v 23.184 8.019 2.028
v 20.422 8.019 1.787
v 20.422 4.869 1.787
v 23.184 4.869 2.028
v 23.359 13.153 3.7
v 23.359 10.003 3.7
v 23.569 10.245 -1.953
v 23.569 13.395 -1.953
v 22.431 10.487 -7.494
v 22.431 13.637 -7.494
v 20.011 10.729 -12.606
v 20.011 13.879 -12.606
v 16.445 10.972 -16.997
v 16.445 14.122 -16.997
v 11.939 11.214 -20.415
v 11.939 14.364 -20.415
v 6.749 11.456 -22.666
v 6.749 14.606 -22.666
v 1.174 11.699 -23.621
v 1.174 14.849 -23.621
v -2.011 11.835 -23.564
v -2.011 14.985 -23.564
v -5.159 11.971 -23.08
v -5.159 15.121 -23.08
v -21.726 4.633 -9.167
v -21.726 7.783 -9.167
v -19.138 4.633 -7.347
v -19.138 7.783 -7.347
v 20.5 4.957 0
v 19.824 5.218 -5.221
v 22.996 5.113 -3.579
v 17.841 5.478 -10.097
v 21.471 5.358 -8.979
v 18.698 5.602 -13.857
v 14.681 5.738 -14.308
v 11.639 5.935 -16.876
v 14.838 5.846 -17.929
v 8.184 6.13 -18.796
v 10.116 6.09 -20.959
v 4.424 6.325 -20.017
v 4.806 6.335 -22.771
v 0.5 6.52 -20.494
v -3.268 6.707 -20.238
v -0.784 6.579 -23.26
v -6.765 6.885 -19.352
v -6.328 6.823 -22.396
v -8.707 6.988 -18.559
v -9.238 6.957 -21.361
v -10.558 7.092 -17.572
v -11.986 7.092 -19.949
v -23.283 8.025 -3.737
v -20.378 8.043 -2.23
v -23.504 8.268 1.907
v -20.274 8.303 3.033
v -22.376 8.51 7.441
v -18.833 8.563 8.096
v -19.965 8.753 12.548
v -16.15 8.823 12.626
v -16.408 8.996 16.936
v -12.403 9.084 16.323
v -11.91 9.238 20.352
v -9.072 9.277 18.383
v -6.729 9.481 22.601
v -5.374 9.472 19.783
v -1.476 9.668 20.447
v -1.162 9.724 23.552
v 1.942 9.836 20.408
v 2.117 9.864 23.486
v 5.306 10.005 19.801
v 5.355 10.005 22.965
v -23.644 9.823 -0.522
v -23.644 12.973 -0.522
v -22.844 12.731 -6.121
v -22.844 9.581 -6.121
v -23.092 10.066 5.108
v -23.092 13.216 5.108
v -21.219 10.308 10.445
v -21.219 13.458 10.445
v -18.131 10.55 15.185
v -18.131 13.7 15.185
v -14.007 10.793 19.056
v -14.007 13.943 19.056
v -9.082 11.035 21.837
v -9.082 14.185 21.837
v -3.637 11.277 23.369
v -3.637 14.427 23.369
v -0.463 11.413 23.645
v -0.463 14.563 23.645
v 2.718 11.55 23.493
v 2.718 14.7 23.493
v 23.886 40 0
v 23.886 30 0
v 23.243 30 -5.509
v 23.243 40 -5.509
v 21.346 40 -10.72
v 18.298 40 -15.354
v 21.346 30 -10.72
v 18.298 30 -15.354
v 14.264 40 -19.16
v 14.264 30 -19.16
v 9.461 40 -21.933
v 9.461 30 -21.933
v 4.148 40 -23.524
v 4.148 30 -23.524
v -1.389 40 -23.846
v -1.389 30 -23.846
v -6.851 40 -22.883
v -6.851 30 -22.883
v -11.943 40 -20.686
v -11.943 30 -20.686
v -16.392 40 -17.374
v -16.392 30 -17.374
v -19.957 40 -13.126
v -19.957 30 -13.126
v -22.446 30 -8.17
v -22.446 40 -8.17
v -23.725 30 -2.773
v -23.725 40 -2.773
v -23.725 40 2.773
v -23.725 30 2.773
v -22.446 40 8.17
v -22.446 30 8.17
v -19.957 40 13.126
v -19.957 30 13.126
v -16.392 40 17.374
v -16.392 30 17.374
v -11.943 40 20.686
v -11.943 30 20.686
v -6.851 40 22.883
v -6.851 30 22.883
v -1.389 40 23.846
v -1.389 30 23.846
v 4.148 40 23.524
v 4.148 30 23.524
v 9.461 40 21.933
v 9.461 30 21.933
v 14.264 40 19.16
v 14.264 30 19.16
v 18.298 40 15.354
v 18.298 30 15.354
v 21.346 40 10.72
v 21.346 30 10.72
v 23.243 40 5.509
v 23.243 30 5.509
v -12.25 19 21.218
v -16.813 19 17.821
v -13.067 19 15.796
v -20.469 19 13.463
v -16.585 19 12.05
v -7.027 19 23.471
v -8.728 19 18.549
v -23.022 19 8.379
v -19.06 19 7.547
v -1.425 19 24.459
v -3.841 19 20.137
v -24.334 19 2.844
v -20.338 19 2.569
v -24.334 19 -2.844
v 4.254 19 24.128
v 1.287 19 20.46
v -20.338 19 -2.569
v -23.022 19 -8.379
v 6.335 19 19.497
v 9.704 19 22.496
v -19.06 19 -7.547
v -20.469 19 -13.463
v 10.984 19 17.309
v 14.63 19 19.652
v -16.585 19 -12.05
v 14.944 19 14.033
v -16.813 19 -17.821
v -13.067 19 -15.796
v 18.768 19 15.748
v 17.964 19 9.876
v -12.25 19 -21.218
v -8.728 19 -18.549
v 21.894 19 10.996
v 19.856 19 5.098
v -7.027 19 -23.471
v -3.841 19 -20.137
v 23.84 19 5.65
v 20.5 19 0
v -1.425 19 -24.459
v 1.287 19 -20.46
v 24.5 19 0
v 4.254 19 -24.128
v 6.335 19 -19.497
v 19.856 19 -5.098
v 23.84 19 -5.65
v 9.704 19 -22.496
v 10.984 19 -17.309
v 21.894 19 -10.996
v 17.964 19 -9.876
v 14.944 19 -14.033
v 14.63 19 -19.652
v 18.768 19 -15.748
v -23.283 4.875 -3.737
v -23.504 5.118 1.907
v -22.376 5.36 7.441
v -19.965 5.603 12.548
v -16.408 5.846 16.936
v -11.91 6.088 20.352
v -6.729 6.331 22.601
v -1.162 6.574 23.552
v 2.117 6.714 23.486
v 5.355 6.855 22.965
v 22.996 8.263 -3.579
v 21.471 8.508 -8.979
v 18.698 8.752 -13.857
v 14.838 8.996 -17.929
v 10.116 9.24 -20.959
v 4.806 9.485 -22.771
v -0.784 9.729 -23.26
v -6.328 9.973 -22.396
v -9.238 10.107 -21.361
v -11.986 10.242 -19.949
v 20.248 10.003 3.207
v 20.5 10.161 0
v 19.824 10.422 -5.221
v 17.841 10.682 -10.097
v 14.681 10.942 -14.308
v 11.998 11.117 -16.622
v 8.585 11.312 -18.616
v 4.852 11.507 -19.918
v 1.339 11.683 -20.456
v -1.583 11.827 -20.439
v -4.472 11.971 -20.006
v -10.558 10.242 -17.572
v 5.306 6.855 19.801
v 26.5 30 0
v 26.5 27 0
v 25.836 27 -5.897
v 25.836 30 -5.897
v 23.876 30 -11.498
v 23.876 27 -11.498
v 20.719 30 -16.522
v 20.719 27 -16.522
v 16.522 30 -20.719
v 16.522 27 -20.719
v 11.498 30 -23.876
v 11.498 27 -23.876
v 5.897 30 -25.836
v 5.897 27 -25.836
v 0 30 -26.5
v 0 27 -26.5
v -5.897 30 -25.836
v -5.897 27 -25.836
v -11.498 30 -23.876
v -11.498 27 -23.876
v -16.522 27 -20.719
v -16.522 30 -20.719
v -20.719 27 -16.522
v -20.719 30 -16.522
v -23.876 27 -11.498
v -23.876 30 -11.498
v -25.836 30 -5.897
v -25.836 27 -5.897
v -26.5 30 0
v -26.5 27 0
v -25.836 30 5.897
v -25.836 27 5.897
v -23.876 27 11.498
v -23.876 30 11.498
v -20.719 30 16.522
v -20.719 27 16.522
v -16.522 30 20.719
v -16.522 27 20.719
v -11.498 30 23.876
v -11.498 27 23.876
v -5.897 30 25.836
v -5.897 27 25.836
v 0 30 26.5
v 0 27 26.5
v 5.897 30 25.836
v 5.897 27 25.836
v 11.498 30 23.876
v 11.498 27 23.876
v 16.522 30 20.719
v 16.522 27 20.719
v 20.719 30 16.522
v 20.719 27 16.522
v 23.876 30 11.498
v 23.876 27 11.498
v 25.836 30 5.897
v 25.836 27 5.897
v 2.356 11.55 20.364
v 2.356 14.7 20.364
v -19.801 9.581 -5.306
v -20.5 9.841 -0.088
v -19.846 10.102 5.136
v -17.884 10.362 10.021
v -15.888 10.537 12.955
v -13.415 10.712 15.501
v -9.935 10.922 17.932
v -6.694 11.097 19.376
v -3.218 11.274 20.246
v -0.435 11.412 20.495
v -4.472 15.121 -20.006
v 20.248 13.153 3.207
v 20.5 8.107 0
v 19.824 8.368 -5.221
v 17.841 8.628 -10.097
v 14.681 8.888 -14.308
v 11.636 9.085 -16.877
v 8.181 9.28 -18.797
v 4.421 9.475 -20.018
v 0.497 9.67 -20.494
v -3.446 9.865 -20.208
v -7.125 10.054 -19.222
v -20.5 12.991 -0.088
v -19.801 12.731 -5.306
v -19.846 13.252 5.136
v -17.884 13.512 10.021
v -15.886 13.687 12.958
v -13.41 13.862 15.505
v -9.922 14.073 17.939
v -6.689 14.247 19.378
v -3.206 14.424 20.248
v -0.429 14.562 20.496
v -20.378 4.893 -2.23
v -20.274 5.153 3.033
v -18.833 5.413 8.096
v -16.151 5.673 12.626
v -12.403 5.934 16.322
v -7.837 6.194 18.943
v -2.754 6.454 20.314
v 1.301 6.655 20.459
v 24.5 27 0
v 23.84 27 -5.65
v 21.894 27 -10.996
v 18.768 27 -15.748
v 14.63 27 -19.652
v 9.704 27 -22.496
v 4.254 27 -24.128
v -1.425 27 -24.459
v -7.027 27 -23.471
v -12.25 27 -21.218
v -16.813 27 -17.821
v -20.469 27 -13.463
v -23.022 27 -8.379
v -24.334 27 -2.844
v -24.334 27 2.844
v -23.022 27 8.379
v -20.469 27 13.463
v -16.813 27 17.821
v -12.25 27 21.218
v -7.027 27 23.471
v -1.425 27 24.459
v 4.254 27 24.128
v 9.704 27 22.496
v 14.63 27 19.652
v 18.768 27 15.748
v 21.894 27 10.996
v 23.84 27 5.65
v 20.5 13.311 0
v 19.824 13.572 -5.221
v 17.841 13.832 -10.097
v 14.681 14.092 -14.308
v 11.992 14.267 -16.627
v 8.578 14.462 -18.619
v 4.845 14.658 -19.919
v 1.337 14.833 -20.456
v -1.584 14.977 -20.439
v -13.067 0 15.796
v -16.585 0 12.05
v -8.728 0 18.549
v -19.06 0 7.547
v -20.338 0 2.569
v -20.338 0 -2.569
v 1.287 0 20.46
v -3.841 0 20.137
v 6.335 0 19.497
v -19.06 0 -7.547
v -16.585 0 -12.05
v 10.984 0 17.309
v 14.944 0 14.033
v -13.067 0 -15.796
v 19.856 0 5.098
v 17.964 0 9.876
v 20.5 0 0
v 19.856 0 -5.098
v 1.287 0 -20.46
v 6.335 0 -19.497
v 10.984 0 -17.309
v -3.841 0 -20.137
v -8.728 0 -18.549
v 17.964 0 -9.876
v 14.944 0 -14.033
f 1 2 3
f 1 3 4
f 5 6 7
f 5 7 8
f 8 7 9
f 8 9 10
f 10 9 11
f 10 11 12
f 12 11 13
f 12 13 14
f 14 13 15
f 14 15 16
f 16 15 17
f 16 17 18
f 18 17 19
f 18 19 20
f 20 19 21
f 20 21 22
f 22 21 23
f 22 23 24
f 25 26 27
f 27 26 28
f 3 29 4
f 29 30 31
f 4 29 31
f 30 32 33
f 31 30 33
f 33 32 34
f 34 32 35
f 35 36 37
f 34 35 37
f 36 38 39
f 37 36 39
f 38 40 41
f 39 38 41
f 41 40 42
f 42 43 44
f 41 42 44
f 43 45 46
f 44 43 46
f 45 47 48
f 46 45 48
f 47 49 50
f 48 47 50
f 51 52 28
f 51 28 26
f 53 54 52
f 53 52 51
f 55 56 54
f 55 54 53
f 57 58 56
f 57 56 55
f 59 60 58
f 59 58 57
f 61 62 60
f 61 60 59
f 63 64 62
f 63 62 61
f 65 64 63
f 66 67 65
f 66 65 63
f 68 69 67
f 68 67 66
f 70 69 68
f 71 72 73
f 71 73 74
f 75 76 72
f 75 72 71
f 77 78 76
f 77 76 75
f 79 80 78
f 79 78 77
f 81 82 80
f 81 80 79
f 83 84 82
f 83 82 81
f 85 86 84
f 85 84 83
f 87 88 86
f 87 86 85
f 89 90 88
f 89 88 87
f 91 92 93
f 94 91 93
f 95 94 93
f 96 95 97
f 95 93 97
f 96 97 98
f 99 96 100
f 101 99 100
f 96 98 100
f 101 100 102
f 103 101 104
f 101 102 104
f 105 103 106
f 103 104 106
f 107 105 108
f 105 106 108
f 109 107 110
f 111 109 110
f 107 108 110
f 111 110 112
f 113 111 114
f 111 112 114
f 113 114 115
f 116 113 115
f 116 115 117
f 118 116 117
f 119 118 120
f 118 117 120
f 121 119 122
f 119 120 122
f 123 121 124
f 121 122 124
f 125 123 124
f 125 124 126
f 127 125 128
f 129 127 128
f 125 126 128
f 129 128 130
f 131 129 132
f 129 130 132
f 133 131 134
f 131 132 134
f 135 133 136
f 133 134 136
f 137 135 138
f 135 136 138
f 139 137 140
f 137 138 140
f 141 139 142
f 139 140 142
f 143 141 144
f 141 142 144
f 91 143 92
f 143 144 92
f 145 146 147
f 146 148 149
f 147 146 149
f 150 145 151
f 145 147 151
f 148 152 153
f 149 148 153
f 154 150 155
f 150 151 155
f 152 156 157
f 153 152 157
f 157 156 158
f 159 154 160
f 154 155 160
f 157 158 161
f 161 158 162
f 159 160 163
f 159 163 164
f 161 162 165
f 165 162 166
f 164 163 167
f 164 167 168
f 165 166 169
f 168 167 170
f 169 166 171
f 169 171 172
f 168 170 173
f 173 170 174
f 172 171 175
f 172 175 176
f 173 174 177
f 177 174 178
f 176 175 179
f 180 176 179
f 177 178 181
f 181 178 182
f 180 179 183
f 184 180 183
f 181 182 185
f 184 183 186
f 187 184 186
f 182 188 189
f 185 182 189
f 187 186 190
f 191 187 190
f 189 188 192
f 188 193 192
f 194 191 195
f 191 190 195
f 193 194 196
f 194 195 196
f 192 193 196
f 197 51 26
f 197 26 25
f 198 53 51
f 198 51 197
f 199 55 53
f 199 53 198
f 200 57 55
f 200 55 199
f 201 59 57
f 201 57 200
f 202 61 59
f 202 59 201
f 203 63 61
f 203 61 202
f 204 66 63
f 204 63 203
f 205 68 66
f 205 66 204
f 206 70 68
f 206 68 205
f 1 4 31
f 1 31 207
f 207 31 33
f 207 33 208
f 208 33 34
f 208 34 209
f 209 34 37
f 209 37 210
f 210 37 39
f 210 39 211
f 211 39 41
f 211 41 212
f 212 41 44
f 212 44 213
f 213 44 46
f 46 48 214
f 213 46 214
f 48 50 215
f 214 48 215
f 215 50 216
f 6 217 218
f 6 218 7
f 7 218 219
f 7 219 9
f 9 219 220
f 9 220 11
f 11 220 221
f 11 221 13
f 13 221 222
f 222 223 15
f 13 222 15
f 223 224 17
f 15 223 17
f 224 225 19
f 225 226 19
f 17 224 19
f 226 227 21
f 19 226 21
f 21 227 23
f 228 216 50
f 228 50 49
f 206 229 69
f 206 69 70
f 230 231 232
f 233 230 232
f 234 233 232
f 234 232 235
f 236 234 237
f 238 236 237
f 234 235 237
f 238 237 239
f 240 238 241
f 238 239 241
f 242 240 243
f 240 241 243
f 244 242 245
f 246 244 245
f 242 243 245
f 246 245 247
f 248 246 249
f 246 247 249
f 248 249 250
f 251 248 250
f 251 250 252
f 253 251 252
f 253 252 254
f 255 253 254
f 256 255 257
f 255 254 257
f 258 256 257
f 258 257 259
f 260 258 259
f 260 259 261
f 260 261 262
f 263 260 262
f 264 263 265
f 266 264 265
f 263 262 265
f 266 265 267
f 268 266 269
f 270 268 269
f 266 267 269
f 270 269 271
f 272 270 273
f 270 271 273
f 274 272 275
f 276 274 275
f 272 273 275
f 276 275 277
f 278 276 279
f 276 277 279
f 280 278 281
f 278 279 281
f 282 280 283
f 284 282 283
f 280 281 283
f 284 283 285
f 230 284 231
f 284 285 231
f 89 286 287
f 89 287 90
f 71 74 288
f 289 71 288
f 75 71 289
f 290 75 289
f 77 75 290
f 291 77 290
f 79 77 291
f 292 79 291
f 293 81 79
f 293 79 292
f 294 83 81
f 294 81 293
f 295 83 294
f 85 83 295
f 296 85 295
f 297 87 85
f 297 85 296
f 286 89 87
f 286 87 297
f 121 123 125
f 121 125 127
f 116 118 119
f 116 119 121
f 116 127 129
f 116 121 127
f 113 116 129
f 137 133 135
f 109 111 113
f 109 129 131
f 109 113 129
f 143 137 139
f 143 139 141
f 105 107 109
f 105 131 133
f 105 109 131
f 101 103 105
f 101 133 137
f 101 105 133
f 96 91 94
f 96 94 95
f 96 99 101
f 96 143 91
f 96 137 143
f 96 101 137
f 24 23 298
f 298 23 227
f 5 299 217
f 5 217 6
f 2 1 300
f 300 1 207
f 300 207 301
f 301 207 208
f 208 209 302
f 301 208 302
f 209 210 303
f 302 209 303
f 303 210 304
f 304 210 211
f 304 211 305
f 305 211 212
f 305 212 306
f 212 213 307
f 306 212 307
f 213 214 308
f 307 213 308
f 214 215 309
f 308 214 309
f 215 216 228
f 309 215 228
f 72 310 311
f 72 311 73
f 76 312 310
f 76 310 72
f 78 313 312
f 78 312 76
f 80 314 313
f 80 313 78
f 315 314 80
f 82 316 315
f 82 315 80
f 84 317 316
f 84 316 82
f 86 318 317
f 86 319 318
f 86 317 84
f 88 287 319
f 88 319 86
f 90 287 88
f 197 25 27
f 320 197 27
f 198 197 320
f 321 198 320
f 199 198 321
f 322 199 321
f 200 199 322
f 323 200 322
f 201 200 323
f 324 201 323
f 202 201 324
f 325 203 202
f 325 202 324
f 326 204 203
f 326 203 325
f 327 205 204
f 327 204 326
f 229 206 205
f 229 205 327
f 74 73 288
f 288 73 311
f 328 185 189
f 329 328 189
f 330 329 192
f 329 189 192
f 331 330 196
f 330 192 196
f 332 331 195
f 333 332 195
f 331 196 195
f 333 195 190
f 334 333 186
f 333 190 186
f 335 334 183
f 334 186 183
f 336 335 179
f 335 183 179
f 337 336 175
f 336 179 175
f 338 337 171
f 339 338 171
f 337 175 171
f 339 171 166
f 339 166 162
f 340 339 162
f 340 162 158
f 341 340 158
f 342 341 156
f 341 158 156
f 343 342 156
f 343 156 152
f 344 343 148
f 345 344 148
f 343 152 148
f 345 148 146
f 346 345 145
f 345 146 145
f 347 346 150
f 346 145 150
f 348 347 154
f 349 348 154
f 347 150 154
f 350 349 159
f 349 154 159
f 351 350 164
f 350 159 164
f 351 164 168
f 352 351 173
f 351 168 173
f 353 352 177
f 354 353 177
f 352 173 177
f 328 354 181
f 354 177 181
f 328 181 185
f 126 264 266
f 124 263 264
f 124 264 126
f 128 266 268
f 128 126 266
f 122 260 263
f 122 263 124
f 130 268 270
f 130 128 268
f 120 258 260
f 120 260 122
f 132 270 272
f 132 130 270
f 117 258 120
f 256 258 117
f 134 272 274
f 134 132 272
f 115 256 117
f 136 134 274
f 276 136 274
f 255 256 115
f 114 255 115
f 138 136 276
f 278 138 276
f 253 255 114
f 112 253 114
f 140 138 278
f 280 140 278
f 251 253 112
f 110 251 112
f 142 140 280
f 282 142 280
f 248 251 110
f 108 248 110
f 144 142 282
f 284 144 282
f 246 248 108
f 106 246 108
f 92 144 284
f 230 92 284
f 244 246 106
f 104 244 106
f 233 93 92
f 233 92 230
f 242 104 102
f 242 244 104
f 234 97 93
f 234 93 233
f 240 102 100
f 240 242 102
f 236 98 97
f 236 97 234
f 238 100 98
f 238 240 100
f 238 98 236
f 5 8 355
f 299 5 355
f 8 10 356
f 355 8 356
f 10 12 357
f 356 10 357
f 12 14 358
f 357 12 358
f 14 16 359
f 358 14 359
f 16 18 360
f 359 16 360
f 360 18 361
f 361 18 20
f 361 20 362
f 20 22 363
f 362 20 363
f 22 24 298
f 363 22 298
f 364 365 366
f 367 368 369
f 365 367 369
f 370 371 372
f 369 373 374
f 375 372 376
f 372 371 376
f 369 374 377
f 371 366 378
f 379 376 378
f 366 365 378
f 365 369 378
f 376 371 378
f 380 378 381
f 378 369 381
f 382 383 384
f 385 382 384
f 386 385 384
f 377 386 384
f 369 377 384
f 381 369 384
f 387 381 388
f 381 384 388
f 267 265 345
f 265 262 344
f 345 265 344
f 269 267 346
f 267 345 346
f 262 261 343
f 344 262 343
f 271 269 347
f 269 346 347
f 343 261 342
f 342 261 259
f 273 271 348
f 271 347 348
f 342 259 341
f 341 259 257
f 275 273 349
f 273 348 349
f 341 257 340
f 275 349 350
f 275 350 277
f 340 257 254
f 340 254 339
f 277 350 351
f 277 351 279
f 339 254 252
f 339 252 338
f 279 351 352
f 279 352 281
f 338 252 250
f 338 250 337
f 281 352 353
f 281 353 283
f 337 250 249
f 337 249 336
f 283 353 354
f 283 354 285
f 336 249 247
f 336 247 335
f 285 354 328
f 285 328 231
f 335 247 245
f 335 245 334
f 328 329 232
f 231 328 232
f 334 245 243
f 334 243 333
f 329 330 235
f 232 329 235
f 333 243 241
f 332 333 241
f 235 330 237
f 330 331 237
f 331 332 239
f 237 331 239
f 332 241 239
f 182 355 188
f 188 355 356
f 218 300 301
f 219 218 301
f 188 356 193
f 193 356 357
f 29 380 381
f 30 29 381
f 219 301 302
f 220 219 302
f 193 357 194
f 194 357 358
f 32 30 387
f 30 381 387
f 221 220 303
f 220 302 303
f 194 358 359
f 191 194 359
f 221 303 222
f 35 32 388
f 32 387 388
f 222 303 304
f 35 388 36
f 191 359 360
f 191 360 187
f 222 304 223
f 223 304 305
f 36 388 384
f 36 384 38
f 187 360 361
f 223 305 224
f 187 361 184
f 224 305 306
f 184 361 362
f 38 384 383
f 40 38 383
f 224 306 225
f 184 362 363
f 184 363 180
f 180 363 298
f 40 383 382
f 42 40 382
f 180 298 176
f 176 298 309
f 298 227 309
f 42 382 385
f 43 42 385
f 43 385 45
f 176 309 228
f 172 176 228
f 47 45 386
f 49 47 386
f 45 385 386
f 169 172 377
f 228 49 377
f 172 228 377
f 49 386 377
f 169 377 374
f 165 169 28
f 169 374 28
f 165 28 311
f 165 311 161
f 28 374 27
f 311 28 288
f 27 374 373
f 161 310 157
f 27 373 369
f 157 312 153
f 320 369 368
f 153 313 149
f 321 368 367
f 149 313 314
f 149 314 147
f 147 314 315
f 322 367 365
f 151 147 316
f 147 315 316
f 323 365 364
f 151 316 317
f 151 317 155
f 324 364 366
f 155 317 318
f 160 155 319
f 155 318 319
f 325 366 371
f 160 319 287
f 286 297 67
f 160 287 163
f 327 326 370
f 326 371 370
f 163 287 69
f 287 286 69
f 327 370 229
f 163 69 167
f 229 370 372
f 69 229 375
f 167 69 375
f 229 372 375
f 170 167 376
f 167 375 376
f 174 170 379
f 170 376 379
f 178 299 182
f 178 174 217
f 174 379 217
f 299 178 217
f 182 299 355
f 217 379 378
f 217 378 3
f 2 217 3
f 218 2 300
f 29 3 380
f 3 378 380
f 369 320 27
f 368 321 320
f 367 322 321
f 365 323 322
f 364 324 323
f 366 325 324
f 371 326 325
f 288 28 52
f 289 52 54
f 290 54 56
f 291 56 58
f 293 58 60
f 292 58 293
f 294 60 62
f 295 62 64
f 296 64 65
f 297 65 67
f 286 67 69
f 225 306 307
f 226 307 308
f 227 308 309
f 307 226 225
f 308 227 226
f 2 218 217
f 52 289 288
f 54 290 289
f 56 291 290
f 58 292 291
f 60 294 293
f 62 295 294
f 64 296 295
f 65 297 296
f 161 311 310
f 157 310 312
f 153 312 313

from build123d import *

# Parameters (mm, degrees)
SKETCH1_R           = 20.5
BOSS_EXTRUDE1_DEPTH = 19
SKETCH2_R           = 24.5
BOSS_EXTRUDE2_DEPTH = 8
SKETCH3_R           = 26.5
BOSS_EXTRUDE3_DEPTH = 3
SKETCH4_R           = 23.886443451
BOSS_EXTRUDE4_DEPTH = 10
SWEEP1_PITCH        = 6.35
SWEEP1_HEIGHT       = 1.9685
SWEEP1_RADIUS       = 20.5
SWEEP1_START_ANGLE  = -105
SKETCH10_W          = 6.049698943
SKETCH10_H          = 3.15
SWEEP2_PITCH        = 6.35
SWEEP2_HEIGHT       = 2.2225
SWEEP2_RADIUS       = 20.5
SWEEP2_START_ANGLE  = -111
SKETCH11_W          = 5.521256515
SKETCH11_H          = 3.15
SWEEP3_PITCH        = 6.35
SWEEP3_HEIGHT       = 2.2225
SWEEP3_RADIUS       = 20.5
SWEEP3_START_ANGLE  = 84.999942704
SKETCH18_W          = 6.3
SKETCH18_H          = 3.15
SWEEP4_PITCH        = 6.35
SWEEP4_HEIGHT       = 1.9685
SWEEP4_RADIUS       = 20.5
SWEEP4_START_ANGLE  = 80.999942704
SKETCH19_W          = 6.3
SKETCH19_H          = 3.15


with BuildPart() as part:
    # Sketch1 → Boss-Extrude1 (new body)
    with BuildSketch(Plane(origin=(0, 0, 0), x_dir=(1, 0, 0), z_dir=(0, 1, 0))):
        Circle(SKETCH1_R)
    extrude(amount=BOSS_EXTRUDE1_DEPTH)

    # Sketch2 → Boss-Extrude2 (add)
    with BuildSketch(Plane(origin=(0, 19, 0), x_dir=(1, 0, 0), z_dir=(0, 1, 0))):
        Circle(SKETCH2_R)
    extrude(amount=BOSS_EXTRUDE2_DEPTH)

    # Sketch3 → Boss-Extrude3 (add)
    with BuildSketch(Plane(origin=(0, 27, 0), x_dir=(1, 0, 0), z_dir=(0, 1, 0))):
        Circle(SKETCH3_R)
    extrude(amount=BOSS_EXTRUDE3_DEPTH)

    # Sketch4 → Boss-Extrude4 (add)
    with BuildSketch(Plane(origin=(0, 30, 0), x_dir=(1, 0, 0), z_dir=(0, 1, 0))):
        Circle(SKETCH4_R)
    extrude(amount=BOSS_EXTRUDE4_DEPTH)

    # Sweep1: sweep along a helix
    with BuildLine() as sweep1_path:
        add(Helix(SWEEP1_PITCH, SWEEP1_HEIGHT, SWEEP1_RADIUS, center=(0, 11.25, 0), direction=(0, 1, 0), mode=Mode.PRIVATE).rotate(Axis((0, 11.25, 0), (0, 1, 0)), SWEEP1_START_ANGLE))
    # Sketch10 → Sweep1 (sweep)
    with BuildSketch(Plane.XY):
        with Locations((-20.625150529, 11.420617779)):
            Rectangle(SKETCH10_W, SKETCH10_H)
    sweep(path=sweep1_path.line, is_frenet=True)

    # Sweep2: sweep along a helix
    with BuildLine() as sweep2_path:
        add(Helix(SWEEP2_PITCH, SWEEP2_HEIGHT, SWEEP2_RADIUS, center=(0, 6.25, 0), direction=(0, 1, 0), mode=Mode.PRIVATE).rotate(Axis((0, 6.25, 0), (0, 1, 0)), SWEEP2_START_ANGLE))
    # Sketch11 → Sweep2 (sweep)
    with BuildSketch(Plane.XY.offset(5)):
        with Locations((-20.28419045, 6.826925212)):
            Rectangle(SKETCH11_W, SKETCH11_H)
    sweep(path=sweep2_path.line, is_frenet=True)

    # Sweep3: sweep along a helix
    with BuildLine() as sweep3_path:
        add(Helix(SWEEP3_PITCH, SWEEP3_HEIGHT, SWEEP3_RADIUS, center=(0, 6.25, 0), direction=(0, 1, 0), mode=Mode.PRIVATE).rotate(Axis((0, 6.25, 0), (0, 1, 0)), SWEEP3_START_ANGLE))
    # Sketch18 → Sweep3 (sweep)
    with BuildSketch(Plane.XY):
        with Locations((20.122904995, 6.532252343)):
            Rectangle(SKETCH18_W, SKETCH18_H)
    sweep(path=sweep3_path.line, is_frenet=True)

    # Sweep4: sweep along a helix
    with BuildLine() as sweep4_path:
        add(Helix(SWEEP4_PITCH, SWEEP4_HEIGHT, SWEEP4_RADIUS, center=(0, 11.25, 0), direction=(0, 1, 0), mode=Mode.PRIVATE).rotate(Axis((0, 11.25, 0), (0, 1, 0)), SWEEP4_START_ANGLE))
    # Sketch19 → Sweep4 (sweep)
    with BuildSketch(Plane.XY):
        with Locations((20.5, 11.736280473)):
            Rectangle(SKETCH19_W, SKETCH19_H)
    sweep(path=sweep4_path.line, is_frenet=True)


solid = part.part
